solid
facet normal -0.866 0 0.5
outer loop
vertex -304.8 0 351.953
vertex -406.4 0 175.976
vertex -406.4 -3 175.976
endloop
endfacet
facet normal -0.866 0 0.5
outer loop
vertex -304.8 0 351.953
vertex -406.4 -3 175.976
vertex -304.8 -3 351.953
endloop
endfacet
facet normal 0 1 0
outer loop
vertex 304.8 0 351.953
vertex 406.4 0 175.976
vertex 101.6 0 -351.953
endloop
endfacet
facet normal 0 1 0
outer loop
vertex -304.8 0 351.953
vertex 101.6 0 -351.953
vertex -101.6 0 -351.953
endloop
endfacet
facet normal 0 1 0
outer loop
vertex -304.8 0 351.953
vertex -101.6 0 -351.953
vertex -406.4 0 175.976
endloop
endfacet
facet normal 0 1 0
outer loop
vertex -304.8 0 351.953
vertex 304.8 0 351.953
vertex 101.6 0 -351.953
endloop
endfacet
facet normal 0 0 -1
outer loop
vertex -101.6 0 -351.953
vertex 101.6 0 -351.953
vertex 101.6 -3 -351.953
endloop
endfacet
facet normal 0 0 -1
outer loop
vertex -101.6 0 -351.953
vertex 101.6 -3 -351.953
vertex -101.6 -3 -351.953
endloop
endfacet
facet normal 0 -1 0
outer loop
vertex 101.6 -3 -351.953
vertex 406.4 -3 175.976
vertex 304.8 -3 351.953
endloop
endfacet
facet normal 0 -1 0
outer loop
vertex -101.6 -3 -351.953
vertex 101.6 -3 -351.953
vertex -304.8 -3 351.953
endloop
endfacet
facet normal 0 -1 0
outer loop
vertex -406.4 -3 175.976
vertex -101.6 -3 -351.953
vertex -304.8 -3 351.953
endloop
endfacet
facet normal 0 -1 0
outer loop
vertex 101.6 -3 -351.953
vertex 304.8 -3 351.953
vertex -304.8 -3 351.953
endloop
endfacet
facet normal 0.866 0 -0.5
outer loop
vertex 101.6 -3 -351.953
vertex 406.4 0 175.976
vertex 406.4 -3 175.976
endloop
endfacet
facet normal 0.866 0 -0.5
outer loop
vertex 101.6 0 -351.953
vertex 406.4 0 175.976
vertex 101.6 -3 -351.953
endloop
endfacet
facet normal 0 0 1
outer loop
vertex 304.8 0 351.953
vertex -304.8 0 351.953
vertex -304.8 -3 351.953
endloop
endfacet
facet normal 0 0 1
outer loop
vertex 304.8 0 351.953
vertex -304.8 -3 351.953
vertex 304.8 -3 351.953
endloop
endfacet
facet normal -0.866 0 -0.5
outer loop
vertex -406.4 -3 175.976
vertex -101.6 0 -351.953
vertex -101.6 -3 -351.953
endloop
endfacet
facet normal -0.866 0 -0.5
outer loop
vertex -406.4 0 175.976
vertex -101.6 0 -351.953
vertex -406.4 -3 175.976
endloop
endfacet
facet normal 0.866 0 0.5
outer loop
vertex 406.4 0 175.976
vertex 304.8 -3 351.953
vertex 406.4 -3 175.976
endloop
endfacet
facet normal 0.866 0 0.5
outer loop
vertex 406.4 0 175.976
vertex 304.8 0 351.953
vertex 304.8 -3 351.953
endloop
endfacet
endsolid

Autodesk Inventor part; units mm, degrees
ref_plane "YZ Plane" through (0, 0, 0) normal (1, 0, 0) x (0, 1, 0)
ref_plane "XZ Plane" through (0, 0, 0) normal (0, 1, 0) x (-1, 0, 0)
ref_plane "XY Plane" through (0, 0, 0) normal (0, 0, 1) x (1, 0, 0)
sketch "Sketch1" plane through (0, 0, 0) normal (0, 1, 0) x (-1, 0, 0)
  line L0 (304.8, 351.9527) -> (-304.8, 351.9527)
  line L1 (-304.8, 351.9527) -> (-406.4, 175.9764)
  line L2 (-406.4, 175.9764) -> (-101.6, -351.9527)
  line L3 (-101.6, -351.9527) -> (101.6, -351.9527)
  line L4 (101.6, -351.9527) -> (406.4, 175.9764)
  line L5 (406.4, 175.9764) -> (304.8, 351.9527)
  line L6 (-254, -87.9882) -> (0, 58.6588) construction
  line L7 (254, -87.9882) -> (0, 58.6588) construction
  line L8 (0, 351.9527) -> (0, 58.6588) construction
  point P0 (-355.6, 263.9645)
  dimension "d0" = 609.6
  dimension "d1" = 203.2
  dimension "d2" = 120
  dimension "d3" = 609.6
  dimension "d4" = 120
  dimension "d5" = 203.2
  dimension "d6" = 240
  dimension "d7" = 609.6
  dimension "d8" = 120
  dimension "d9" = 203.2
  dimension "d10" = 120
  dimension "d16" = 293.2939
  dimension "d17" = 120
  dimension "d18" = 120
  dimension "d19" = 120
extrude "Extrusion1" add sketch "Sketch1" against normal blind 3
properties part number "Top Plate"
